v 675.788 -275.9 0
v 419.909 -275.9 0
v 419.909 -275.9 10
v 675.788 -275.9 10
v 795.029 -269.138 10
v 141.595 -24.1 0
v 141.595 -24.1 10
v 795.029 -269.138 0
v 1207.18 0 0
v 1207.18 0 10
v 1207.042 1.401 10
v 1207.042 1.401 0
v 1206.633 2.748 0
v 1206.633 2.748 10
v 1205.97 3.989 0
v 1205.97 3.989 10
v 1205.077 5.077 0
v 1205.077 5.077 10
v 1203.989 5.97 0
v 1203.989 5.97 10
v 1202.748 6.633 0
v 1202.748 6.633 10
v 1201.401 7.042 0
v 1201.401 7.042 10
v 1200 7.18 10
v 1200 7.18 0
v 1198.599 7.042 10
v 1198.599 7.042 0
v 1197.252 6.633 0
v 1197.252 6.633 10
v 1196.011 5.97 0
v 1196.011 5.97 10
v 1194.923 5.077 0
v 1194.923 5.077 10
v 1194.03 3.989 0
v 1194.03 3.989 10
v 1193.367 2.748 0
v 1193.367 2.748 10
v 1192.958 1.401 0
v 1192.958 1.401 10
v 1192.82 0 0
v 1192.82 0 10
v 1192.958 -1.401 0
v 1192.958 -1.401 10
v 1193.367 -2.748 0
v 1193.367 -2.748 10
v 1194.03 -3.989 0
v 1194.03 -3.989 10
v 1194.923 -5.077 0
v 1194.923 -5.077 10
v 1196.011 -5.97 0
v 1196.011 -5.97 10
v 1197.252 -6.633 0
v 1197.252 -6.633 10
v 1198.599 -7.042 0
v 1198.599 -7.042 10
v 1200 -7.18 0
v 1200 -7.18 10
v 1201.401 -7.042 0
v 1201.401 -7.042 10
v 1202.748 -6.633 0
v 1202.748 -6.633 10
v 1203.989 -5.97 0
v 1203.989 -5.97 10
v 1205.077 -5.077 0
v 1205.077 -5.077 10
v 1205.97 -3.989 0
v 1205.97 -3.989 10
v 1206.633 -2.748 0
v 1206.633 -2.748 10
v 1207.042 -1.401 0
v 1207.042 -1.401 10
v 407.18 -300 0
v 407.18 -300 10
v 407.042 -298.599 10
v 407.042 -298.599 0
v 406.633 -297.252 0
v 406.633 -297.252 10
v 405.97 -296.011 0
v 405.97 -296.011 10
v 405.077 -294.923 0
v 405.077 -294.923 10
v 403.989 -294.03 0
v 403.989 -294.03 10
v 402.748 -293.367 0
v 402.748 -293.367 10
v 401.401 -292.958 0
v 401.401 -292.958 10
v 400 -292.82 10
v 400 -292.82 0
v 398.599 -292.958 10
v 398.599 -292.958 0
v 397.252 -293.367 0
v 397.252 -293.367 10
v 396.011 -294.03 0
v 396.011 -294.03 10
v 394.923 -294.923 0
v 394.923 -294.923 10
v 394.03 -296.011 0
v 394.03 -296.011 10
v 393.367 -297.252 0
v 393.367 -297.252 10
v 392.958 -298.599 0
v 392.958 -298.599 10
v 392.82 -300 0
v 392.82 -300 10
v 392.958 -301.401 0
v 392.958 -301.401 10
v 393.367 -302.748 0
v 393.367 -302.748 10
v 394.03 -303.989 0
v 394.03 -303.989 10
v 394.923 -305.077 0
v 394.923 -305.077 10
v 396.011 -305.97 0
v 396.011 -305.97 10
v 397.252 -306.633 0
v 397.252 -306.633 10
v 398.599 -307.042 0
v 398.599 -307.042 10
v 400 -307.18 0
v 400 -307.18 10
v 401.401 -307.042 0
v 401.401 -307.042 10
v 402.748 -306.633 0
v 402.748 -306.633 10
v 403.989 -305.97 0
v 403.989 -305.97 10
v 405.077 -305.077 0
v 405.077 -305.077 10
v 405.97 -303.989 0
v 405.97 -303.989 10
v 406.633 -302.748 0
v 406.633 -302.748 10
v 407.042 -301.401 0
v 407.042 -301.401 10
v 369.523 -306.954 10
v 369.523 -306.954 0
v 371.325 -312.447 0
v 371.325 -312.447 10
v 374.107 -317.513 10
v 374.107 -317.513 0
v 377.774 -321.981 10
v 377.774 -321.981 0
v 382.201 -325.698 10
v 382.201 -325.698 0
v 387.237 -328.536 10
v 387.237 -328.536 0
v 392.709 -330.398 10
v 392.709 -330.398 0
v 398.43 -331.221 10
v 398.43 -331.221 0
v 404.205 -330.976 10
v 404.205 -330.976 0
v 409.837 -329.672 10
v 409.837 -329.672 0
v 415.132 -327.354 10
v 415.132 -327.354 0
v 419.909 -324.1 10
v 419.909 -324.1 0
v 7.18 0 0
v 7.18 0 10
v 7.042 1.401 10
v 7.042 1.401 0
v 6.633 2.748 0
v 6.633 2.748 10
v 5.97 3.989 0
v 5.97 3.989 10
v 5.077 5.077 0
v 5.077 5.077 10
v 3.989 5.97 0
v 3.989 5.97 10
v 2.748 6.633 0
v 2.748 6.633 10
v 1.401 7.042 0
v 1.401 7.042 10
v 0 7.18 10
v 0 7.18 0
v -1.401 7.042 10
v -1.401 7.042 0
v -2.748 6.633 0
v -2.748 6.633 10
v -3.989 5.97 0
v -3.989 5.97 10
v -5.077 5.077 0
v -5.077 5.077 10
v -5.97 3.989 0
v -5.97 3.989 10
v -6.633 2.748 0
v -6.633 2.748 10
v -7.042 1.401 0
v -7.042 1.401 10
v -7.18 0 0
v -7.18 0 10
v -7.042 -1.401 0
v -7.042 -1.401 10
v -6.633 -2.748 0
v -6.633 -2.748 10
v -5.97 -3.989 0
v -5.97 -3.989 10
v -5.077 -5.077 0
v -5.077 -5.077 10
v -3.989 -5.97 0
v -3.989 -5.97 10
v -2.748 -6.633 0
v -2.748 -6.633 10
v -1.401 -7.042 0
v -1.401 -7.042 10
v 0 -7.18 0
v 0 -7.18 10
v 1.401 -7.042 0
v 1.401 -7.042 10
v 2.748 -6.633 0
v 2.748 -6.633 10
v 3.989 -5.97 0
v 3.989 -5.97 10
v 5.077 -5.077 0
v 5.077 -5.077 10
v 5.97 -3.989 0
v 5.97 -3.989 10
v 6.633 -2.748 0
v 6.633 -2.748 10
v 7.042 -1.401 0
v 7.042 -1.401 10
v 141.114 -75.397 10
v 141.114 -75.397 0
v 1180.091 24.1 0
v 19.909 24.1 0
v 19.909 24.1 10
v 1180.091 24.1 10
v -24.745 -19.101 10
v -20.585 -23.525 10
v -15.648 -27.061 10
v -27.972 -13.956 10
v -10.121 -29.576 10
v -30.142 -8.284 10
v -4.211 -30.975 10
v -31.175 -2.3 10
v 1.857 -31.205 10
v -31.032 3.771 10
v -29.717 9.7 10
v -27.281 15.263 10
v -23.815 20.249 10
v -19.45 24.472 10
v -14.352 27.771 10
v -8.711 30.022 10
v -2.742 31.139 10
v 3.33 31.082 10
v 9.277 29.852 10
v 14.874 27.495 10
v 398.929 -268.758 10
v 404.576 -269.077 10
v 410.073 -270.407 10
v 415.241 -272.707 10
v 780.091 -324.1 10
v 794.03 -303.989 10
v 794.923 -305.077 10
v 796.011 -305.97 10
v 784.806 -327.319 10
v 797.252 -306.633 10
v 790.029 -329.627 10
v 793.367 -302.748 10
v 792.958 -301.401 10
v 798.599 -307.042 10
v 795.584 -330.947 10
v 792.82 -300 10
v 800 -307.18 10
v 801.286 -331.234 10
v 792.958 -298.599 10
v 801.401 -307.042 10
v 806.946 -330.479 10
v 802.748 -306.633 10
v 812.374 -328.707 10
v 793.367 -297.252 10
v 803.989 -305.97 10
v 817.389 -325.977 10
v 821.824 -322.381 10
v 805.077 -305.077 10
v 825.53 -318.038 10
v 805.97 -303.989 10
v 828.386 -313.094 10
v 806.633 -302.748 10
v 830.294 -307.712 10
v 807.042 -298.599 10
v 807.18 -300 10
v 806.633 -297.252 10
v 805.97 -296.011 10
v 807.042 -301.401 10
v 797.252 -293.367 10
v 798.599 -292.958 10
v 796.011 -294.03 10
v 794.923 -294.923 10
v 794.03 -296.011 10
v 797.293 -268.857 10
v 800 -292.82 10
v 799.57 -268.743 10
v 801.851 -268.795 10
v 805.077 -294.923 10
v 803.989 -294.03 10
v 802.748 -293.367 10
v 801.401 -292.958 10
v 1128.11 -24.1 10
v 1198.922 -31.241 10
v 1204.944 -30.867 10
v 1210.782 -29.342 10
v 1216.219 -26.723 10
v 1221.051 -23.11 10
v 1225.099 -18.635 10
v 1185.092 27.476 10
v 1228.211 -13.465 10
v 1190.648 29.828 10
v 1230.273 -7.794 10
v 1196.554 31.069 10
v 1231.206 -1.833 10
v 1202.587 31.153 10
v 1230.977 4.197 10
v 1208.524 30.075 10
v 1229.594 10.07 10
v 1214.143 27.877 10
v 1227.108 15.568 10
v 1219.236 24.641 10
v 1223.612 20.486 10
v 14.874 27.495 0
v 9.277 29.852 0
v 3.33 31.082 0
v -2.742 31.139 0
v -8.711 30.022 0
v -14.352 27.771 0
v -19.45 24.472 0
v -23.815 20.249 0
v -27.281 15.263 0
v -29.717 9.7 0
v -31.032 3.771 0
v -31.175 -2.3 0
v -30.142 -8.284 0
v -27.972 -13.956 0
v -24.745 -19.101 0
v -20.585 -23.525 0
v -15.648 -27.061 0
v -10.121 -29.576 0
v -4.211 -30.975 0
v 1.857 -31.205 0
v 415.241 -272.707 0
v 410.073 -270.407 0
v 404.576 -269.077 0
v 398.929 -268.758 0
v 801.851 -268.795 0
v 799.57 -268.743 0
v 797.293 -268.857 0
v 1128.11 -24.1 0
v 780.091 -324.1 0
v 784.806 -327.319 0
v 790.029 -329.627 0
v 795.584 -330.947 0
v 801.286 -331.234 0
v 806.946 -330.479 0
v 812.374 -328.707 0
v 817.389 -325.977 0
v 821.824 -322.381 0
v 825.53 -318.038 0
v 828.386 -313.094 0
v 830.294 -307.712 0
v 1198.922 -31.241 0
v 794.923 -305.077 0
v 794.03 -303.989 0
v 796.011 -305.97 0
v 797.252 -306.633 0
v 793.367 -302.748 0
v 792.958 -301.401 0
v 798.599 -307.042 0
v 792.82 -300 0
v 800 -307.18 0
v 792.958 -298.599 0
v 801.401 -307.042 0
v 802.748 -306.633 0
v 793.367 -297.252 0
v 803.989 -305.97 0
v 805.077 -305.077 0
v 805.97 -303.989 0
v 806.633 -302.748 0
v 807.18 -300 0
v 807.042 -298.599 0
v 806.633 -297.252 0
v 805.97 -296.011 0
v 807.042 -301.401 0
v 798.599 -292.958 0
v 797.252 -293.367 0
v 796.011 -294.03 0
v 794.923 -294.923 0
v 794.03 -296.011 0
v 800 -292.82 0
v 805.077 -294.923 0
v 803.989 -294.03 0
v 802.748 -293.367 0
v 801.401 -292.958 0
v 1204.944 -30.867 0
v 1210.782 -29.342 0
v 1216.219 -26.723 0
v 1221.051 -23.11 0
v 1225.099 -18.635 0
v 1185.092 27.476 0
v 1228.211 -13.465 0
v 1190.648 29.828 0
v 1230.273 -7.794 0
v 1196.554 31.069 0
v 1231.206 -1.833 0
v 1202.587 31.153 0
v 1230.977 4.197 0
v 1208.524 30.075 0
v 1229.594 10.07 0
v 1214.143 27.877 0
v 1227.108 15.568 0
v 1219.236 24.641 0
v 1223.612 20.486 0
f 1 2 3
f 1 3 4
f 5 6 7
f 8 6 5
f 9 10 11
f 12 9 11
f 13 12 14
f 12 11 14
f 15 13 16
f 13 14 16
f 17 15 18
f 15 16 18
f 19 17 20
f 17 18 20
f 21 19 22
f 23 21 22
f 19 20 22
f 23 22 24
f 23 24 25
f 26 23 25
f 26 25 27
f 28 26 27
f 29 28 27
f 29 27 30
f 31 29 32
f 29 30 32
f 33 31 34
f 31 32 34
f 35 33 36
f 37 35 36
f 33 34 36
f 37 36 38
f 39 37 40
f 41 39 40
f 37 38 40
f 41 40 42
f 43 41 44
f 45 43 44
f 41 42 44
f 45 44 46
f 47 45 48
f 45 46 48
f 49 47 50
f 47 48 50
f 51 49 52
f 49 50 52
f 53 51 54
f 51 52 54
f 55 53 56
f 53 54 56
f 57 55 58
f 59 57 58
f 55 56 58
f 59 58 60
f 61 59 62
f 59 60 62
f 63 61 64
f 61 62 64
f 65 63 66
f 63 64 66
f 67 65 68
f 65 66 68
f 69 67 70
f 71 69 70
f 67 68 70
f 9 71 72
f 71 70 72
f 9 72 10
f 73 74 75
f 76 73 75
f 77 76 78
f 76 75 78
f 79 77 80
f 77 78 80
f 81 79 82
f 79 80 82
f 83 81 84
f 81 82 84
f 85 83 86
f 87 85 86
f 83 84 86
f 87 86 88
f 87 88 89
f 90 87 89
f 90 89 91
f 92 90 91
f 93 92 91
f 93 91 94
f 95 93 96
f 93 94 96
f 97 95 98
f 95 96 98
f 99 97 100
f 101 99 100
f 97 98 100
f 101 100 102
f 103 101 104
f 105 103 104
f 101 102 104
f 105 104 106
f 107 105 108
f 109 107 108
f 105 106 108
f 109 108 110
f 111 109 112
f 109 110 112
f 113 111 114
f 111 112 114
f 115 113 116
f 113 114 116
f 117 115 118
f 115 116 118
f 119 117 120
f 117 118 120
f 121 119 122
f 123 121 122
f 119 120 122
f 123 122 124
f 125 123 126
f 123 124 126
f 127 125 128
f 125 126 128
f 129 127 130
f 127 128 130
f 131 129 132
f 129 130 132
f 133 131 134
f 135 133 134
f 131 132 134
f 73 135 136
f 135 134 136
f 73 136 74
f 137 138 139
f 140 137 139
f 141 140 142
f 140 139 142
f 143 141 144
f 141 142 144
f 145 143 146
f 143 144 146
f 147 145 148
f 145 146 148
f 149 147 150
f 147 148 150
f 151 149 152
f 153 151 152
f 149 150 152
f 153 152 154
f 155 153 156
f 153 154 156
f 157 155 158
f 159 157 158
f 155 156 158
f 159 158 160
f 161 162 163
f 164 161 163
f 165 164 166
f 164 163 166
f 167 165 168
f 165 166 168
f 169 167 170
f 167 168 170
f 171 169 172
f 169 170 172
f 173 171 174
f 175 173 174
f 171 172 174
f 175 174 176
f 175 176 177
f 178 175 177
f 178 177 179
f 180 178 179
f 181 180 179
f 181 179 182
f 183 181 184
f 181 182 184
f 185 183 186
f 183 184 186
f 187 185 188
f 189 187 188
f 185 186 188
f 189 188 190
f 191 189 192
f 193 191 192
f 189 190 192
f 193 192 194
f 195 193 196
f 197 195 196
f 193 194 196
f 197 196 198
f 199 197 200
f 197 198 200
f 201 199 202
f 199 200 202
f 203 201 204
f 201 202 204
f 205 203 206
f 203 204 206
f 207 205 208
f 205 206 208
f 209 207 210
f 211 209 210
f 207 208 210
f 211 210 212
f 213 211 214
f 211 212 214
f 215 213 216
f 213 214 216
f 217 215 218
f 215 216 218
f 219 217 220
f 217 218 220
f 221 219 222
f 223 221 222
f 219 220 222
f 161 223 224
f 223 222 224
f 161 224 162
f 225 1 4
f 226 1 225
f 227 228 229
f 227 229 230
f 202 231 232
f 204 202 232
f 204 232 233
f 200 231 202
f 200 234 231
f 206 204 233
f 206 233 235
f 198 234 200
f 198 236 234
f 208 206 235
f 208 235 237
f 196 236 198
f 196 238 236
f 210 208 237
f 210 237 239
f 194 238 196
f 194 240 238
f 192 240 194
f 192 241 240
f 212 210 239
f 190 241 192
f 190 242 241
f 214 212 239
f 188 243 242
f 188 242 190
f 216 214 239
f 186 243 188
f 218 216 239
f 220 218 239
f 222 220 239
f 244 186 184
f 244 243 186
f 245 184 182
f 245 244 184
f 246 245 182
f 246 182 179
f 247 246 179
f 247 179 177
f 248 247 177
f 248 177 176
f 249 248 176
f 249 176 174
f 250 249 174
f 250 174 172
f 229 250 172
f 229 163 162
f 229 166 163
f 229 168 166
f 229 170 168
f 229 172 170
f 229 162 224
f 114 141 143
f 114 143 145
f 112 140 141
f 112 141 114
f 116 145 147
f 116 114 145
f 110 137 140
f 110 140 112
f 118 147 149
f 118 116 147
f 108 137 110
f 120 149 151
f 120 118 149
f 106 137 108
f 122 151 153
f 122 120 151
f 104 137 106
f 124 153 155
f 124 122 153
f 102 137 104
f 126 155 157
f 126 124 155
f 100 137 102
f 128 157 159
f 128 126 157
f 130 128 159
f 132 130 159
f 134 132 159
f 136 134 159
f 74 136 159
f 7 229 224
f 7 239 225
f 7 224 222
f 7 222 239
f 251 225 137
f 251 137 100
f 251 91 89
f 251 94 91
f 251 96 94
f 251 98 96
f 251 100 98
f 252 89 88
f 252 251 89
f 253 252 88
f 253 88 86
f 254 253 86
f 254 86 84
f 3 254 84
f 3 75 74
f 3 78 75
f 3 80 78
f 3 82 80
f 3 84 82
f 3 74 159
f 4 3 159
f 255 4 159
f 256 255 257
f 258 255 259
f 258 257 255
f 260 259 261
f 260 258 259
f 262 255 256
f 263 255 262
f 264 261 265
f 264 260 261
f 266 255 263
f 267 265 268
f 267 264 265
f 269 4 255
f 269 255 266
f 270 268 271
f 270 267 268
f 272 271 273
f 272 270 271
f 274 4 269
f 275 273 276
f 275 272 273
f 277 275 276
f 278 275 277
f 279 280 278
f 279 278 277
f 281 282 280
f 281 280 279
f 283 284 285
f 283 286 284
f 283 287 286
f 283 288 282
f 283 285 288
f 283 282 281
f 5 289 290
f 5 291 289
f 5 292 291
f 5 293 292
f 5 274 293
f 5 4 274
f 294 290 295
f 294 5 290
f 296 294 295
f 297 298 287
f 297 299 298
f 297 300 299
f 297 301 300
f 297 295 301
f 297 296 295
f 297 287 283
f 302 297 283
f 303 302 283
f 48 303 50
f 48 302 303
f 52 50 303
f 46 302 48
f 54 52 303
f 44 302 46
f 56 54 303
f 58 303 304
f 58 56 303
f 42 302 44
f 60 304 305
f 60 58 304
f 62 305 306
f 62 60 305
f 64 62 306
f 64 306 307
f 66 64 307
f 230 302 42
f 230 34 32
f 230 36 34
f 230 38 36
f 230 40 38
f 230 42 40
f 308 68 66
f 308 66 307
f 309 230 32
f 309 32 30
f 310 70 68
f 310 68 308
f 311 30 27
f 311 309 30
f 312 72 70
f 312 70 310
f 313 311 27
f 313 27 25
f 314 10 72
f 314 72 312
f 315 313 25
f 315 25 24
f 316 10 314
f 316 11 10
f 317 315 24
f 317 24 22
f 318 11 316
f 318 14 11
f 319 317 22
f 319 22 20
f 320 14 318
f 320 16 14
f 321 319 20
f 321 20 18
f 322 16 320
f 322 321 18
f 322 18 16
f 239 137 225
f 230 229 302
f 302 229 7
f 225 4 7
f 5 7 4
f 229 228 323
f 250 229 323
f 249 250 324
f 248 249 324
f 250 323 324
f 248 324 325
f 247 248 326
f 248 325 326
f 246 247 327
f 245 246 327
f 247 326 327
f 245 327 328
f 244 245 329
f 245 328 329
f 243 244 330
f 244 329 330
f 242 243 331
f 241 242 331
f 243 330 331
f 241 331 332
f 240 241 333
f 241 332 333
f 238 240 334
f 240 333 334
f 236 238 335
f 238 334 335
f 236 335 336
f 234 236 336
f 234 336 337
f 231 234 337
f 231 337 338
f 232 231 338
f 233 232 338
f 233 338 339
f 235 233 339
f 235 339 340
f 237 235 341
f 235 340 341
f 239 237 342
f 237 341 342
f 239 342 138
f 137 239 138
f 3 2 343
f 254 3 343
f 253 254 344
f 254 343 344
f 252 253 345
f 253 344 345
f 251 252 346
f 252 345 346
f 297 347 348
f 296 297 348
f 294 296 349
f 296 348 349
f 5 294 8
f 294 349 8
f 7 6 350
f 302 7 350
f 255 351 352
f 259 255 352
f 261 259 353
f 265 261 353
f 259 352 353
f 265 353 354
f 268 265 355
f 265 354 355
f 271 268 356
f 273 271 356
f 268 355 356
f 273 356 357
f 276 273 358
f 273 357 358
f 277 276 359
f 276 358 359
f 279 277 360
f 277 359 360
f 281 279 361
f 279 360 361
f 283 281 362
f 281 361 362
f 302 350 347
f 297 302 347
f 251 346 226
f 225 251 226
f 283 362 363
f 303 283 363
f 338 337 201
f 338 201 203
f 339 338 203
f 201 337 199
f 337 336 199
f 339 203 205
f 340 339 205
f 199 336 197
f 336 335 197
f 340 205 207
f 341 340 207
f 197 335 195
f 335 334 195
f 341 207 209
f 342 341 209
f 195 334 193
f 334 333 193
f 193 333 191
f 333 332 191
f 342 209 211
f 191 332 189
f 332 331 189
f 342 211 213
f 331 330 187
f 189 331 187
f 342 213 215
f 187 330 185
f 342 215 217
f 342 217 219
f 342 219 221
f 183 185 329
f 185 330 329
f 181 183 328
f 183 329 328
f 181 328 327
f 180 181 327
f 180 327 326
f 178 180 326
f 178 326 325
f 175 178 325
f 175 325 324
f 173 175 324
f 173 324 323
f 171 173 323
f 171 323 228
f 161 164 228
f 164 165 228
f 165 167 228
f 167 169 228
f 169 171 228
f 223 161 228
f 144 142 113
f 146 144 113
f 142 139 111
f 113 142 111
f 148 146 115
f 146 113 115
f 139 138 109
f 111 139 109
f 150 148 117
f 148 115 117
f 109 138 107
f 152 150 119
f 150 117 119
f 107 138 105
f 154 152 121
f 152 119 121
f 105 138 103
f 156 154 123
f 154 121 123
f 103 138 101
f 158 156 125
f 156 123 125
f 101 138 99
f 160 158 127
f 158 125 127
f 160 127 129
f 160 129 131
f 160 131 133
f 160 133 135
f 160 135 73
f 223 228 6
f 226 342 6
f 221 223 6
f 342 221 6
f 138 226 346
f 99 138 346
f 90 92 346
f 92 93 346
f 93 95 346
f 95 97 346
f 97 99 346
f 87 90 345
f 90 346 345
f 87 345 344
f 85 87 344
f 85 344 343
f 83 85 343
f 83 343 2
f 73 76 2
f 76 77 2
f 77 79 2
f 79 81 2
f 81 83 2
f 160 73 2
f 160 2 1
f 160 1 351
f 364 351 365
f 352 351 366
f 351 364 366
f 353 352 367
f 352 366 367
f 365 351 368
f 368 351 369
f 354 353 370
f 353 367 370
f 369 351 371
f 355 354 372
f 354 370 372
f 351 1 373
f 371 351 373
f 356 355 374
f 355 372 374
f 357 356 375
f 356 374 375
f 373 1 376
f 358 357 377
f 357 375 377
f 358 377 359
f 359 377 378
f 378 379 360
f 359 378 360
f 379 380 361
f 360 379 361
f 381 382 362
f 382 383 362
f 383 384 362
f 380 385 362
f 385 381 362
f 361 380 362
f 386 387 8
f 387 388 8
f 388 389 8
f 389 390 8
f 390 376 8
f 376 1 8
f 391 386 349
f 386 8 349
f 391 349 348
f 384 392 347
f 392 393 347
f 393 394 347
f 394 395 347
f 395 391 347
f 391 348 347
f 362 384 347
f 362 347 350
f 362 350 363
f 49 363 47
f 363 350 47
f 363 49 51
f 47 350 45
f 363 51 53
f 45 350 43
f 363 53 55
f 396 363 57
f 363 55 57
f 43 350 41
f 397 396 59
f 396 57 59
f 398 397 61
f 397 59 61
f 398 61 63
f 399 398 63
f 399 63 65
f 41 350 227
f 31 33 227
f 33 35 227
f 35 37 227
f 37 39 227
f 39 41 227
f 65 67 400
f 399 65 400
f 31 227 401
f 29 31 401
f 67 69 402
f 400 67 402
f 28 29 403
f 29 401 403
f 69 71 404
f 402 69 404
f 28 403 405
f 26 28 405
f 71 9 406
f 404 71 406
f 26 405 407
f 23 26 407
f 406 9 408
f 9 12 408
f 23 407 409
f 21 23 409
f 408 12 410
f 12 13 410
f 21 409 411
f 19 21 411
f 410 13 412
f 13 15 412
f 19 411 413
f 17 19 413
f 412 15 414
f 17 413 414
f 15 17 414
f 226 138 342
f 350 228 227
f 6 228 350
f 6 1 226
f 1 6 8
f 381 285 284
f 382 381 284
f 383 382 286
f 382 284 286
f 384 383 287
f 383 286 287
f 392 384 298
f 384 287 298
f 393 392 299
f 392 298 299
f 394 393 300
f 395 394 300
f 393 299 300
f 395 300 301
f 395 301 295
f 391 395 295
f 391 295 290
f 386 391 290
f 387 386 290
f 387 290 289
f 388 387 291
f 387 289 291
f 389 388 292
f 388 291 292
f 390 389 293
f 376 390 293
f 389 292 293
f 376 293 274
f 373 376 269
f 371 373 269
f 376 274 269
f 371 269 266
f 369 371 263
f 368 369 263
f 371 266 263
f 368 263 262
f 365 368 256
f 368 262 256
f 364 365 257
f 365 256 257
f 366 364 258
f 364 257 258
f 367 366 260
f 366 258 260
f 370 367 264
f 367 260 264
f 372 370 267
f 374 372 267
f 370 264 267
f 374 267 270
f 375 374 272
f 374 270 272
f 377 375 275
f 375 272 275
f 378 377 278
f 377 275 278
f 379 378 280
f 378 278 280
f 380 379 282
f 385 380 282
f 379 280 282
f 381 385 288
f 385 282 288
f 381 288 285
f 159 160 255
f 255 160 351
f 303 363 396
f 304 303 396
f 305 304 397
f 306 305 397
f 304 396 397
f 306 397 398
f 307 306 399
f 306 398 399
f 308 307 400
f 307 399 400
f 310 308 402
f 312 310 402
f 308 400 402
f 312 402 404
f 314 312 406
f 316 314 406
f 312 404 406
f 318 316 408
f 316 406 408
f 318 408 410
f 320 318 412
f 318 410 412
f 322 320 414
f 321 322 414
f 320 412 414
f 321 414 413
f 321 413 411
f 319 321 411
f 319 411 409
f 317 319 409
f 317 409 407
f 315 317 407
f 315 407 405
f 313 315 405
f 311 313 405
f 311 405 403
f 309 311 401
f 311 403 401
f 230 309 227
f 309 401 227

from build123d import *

# Parameters (mm, degrees)
SKETCH2_R           = 31.26
SKETCH2_W           = 400
SKETCH2_H           = 48.2
SKETCH2_W_2         = 1200
BOSS_EXTRUDE4_DEPTH = 10
SKETCH3_R           = 7.18
CUT_EXTRUDE1_DEPTH  = 10


with BuildPart() as part:
    # Sketch2 → Boss-Extrude4 (new body)
    with BuildSketch(Plane.XY):
        with Locations((400, -300)):
            Circle(SKETCH2_R)
        with Locations((800, -300)):
            Circle(SKETCH2_R)
        Circle(SKETCH2_R)
        with Locations((1200, 0)):
            Circle(SKETCH2_R)
        with Locations((600, -300)):
            Rectangle(SKETCH2_W, SKETCH2_H)
        with Locations((600, 0)):
            Rectangle(SKETCH2_W_2, SKETCH2_H)
        Polygon((414.610371201, -280.519505066), (14.610371201, 19.480494934), (-14.309628799, -19.079505066), (385.690371201, -319.079505066), align=None)
        Polygon((1185.687703452, 19.083062065), (785.687703452, -280.916937935), (814.607703452, -319.476937935), (1214.607703452, -19.476937935), align=None)
        Polygon((792.609480398, -319.708052273), (-7.390519602, -19.708052273), (9.533630282, 25.423014086), (809.533630282, -274.576985914), align=None)
    extrude(amount=BOSS_EXTRUDE4_DEPTH)

    # Sketch3 → Cut-Extrude1 (cut)
    with BuildSketch(Plane.XY.offset(10)):
        Circle(SKETCH3_R)
        with Locations((1200, 0)):
            Circle(SKETCH3_R)
        with Locations((800, -300)):
            Circle(SKETCH3_R)
        with Locations((400, -300)):
            Circle(SKETCH3_R)
    extrude(amount=-CUT_EXTRUDE1_DEPTH, mode=Mode.SUBTRACT)


solid = part.part
